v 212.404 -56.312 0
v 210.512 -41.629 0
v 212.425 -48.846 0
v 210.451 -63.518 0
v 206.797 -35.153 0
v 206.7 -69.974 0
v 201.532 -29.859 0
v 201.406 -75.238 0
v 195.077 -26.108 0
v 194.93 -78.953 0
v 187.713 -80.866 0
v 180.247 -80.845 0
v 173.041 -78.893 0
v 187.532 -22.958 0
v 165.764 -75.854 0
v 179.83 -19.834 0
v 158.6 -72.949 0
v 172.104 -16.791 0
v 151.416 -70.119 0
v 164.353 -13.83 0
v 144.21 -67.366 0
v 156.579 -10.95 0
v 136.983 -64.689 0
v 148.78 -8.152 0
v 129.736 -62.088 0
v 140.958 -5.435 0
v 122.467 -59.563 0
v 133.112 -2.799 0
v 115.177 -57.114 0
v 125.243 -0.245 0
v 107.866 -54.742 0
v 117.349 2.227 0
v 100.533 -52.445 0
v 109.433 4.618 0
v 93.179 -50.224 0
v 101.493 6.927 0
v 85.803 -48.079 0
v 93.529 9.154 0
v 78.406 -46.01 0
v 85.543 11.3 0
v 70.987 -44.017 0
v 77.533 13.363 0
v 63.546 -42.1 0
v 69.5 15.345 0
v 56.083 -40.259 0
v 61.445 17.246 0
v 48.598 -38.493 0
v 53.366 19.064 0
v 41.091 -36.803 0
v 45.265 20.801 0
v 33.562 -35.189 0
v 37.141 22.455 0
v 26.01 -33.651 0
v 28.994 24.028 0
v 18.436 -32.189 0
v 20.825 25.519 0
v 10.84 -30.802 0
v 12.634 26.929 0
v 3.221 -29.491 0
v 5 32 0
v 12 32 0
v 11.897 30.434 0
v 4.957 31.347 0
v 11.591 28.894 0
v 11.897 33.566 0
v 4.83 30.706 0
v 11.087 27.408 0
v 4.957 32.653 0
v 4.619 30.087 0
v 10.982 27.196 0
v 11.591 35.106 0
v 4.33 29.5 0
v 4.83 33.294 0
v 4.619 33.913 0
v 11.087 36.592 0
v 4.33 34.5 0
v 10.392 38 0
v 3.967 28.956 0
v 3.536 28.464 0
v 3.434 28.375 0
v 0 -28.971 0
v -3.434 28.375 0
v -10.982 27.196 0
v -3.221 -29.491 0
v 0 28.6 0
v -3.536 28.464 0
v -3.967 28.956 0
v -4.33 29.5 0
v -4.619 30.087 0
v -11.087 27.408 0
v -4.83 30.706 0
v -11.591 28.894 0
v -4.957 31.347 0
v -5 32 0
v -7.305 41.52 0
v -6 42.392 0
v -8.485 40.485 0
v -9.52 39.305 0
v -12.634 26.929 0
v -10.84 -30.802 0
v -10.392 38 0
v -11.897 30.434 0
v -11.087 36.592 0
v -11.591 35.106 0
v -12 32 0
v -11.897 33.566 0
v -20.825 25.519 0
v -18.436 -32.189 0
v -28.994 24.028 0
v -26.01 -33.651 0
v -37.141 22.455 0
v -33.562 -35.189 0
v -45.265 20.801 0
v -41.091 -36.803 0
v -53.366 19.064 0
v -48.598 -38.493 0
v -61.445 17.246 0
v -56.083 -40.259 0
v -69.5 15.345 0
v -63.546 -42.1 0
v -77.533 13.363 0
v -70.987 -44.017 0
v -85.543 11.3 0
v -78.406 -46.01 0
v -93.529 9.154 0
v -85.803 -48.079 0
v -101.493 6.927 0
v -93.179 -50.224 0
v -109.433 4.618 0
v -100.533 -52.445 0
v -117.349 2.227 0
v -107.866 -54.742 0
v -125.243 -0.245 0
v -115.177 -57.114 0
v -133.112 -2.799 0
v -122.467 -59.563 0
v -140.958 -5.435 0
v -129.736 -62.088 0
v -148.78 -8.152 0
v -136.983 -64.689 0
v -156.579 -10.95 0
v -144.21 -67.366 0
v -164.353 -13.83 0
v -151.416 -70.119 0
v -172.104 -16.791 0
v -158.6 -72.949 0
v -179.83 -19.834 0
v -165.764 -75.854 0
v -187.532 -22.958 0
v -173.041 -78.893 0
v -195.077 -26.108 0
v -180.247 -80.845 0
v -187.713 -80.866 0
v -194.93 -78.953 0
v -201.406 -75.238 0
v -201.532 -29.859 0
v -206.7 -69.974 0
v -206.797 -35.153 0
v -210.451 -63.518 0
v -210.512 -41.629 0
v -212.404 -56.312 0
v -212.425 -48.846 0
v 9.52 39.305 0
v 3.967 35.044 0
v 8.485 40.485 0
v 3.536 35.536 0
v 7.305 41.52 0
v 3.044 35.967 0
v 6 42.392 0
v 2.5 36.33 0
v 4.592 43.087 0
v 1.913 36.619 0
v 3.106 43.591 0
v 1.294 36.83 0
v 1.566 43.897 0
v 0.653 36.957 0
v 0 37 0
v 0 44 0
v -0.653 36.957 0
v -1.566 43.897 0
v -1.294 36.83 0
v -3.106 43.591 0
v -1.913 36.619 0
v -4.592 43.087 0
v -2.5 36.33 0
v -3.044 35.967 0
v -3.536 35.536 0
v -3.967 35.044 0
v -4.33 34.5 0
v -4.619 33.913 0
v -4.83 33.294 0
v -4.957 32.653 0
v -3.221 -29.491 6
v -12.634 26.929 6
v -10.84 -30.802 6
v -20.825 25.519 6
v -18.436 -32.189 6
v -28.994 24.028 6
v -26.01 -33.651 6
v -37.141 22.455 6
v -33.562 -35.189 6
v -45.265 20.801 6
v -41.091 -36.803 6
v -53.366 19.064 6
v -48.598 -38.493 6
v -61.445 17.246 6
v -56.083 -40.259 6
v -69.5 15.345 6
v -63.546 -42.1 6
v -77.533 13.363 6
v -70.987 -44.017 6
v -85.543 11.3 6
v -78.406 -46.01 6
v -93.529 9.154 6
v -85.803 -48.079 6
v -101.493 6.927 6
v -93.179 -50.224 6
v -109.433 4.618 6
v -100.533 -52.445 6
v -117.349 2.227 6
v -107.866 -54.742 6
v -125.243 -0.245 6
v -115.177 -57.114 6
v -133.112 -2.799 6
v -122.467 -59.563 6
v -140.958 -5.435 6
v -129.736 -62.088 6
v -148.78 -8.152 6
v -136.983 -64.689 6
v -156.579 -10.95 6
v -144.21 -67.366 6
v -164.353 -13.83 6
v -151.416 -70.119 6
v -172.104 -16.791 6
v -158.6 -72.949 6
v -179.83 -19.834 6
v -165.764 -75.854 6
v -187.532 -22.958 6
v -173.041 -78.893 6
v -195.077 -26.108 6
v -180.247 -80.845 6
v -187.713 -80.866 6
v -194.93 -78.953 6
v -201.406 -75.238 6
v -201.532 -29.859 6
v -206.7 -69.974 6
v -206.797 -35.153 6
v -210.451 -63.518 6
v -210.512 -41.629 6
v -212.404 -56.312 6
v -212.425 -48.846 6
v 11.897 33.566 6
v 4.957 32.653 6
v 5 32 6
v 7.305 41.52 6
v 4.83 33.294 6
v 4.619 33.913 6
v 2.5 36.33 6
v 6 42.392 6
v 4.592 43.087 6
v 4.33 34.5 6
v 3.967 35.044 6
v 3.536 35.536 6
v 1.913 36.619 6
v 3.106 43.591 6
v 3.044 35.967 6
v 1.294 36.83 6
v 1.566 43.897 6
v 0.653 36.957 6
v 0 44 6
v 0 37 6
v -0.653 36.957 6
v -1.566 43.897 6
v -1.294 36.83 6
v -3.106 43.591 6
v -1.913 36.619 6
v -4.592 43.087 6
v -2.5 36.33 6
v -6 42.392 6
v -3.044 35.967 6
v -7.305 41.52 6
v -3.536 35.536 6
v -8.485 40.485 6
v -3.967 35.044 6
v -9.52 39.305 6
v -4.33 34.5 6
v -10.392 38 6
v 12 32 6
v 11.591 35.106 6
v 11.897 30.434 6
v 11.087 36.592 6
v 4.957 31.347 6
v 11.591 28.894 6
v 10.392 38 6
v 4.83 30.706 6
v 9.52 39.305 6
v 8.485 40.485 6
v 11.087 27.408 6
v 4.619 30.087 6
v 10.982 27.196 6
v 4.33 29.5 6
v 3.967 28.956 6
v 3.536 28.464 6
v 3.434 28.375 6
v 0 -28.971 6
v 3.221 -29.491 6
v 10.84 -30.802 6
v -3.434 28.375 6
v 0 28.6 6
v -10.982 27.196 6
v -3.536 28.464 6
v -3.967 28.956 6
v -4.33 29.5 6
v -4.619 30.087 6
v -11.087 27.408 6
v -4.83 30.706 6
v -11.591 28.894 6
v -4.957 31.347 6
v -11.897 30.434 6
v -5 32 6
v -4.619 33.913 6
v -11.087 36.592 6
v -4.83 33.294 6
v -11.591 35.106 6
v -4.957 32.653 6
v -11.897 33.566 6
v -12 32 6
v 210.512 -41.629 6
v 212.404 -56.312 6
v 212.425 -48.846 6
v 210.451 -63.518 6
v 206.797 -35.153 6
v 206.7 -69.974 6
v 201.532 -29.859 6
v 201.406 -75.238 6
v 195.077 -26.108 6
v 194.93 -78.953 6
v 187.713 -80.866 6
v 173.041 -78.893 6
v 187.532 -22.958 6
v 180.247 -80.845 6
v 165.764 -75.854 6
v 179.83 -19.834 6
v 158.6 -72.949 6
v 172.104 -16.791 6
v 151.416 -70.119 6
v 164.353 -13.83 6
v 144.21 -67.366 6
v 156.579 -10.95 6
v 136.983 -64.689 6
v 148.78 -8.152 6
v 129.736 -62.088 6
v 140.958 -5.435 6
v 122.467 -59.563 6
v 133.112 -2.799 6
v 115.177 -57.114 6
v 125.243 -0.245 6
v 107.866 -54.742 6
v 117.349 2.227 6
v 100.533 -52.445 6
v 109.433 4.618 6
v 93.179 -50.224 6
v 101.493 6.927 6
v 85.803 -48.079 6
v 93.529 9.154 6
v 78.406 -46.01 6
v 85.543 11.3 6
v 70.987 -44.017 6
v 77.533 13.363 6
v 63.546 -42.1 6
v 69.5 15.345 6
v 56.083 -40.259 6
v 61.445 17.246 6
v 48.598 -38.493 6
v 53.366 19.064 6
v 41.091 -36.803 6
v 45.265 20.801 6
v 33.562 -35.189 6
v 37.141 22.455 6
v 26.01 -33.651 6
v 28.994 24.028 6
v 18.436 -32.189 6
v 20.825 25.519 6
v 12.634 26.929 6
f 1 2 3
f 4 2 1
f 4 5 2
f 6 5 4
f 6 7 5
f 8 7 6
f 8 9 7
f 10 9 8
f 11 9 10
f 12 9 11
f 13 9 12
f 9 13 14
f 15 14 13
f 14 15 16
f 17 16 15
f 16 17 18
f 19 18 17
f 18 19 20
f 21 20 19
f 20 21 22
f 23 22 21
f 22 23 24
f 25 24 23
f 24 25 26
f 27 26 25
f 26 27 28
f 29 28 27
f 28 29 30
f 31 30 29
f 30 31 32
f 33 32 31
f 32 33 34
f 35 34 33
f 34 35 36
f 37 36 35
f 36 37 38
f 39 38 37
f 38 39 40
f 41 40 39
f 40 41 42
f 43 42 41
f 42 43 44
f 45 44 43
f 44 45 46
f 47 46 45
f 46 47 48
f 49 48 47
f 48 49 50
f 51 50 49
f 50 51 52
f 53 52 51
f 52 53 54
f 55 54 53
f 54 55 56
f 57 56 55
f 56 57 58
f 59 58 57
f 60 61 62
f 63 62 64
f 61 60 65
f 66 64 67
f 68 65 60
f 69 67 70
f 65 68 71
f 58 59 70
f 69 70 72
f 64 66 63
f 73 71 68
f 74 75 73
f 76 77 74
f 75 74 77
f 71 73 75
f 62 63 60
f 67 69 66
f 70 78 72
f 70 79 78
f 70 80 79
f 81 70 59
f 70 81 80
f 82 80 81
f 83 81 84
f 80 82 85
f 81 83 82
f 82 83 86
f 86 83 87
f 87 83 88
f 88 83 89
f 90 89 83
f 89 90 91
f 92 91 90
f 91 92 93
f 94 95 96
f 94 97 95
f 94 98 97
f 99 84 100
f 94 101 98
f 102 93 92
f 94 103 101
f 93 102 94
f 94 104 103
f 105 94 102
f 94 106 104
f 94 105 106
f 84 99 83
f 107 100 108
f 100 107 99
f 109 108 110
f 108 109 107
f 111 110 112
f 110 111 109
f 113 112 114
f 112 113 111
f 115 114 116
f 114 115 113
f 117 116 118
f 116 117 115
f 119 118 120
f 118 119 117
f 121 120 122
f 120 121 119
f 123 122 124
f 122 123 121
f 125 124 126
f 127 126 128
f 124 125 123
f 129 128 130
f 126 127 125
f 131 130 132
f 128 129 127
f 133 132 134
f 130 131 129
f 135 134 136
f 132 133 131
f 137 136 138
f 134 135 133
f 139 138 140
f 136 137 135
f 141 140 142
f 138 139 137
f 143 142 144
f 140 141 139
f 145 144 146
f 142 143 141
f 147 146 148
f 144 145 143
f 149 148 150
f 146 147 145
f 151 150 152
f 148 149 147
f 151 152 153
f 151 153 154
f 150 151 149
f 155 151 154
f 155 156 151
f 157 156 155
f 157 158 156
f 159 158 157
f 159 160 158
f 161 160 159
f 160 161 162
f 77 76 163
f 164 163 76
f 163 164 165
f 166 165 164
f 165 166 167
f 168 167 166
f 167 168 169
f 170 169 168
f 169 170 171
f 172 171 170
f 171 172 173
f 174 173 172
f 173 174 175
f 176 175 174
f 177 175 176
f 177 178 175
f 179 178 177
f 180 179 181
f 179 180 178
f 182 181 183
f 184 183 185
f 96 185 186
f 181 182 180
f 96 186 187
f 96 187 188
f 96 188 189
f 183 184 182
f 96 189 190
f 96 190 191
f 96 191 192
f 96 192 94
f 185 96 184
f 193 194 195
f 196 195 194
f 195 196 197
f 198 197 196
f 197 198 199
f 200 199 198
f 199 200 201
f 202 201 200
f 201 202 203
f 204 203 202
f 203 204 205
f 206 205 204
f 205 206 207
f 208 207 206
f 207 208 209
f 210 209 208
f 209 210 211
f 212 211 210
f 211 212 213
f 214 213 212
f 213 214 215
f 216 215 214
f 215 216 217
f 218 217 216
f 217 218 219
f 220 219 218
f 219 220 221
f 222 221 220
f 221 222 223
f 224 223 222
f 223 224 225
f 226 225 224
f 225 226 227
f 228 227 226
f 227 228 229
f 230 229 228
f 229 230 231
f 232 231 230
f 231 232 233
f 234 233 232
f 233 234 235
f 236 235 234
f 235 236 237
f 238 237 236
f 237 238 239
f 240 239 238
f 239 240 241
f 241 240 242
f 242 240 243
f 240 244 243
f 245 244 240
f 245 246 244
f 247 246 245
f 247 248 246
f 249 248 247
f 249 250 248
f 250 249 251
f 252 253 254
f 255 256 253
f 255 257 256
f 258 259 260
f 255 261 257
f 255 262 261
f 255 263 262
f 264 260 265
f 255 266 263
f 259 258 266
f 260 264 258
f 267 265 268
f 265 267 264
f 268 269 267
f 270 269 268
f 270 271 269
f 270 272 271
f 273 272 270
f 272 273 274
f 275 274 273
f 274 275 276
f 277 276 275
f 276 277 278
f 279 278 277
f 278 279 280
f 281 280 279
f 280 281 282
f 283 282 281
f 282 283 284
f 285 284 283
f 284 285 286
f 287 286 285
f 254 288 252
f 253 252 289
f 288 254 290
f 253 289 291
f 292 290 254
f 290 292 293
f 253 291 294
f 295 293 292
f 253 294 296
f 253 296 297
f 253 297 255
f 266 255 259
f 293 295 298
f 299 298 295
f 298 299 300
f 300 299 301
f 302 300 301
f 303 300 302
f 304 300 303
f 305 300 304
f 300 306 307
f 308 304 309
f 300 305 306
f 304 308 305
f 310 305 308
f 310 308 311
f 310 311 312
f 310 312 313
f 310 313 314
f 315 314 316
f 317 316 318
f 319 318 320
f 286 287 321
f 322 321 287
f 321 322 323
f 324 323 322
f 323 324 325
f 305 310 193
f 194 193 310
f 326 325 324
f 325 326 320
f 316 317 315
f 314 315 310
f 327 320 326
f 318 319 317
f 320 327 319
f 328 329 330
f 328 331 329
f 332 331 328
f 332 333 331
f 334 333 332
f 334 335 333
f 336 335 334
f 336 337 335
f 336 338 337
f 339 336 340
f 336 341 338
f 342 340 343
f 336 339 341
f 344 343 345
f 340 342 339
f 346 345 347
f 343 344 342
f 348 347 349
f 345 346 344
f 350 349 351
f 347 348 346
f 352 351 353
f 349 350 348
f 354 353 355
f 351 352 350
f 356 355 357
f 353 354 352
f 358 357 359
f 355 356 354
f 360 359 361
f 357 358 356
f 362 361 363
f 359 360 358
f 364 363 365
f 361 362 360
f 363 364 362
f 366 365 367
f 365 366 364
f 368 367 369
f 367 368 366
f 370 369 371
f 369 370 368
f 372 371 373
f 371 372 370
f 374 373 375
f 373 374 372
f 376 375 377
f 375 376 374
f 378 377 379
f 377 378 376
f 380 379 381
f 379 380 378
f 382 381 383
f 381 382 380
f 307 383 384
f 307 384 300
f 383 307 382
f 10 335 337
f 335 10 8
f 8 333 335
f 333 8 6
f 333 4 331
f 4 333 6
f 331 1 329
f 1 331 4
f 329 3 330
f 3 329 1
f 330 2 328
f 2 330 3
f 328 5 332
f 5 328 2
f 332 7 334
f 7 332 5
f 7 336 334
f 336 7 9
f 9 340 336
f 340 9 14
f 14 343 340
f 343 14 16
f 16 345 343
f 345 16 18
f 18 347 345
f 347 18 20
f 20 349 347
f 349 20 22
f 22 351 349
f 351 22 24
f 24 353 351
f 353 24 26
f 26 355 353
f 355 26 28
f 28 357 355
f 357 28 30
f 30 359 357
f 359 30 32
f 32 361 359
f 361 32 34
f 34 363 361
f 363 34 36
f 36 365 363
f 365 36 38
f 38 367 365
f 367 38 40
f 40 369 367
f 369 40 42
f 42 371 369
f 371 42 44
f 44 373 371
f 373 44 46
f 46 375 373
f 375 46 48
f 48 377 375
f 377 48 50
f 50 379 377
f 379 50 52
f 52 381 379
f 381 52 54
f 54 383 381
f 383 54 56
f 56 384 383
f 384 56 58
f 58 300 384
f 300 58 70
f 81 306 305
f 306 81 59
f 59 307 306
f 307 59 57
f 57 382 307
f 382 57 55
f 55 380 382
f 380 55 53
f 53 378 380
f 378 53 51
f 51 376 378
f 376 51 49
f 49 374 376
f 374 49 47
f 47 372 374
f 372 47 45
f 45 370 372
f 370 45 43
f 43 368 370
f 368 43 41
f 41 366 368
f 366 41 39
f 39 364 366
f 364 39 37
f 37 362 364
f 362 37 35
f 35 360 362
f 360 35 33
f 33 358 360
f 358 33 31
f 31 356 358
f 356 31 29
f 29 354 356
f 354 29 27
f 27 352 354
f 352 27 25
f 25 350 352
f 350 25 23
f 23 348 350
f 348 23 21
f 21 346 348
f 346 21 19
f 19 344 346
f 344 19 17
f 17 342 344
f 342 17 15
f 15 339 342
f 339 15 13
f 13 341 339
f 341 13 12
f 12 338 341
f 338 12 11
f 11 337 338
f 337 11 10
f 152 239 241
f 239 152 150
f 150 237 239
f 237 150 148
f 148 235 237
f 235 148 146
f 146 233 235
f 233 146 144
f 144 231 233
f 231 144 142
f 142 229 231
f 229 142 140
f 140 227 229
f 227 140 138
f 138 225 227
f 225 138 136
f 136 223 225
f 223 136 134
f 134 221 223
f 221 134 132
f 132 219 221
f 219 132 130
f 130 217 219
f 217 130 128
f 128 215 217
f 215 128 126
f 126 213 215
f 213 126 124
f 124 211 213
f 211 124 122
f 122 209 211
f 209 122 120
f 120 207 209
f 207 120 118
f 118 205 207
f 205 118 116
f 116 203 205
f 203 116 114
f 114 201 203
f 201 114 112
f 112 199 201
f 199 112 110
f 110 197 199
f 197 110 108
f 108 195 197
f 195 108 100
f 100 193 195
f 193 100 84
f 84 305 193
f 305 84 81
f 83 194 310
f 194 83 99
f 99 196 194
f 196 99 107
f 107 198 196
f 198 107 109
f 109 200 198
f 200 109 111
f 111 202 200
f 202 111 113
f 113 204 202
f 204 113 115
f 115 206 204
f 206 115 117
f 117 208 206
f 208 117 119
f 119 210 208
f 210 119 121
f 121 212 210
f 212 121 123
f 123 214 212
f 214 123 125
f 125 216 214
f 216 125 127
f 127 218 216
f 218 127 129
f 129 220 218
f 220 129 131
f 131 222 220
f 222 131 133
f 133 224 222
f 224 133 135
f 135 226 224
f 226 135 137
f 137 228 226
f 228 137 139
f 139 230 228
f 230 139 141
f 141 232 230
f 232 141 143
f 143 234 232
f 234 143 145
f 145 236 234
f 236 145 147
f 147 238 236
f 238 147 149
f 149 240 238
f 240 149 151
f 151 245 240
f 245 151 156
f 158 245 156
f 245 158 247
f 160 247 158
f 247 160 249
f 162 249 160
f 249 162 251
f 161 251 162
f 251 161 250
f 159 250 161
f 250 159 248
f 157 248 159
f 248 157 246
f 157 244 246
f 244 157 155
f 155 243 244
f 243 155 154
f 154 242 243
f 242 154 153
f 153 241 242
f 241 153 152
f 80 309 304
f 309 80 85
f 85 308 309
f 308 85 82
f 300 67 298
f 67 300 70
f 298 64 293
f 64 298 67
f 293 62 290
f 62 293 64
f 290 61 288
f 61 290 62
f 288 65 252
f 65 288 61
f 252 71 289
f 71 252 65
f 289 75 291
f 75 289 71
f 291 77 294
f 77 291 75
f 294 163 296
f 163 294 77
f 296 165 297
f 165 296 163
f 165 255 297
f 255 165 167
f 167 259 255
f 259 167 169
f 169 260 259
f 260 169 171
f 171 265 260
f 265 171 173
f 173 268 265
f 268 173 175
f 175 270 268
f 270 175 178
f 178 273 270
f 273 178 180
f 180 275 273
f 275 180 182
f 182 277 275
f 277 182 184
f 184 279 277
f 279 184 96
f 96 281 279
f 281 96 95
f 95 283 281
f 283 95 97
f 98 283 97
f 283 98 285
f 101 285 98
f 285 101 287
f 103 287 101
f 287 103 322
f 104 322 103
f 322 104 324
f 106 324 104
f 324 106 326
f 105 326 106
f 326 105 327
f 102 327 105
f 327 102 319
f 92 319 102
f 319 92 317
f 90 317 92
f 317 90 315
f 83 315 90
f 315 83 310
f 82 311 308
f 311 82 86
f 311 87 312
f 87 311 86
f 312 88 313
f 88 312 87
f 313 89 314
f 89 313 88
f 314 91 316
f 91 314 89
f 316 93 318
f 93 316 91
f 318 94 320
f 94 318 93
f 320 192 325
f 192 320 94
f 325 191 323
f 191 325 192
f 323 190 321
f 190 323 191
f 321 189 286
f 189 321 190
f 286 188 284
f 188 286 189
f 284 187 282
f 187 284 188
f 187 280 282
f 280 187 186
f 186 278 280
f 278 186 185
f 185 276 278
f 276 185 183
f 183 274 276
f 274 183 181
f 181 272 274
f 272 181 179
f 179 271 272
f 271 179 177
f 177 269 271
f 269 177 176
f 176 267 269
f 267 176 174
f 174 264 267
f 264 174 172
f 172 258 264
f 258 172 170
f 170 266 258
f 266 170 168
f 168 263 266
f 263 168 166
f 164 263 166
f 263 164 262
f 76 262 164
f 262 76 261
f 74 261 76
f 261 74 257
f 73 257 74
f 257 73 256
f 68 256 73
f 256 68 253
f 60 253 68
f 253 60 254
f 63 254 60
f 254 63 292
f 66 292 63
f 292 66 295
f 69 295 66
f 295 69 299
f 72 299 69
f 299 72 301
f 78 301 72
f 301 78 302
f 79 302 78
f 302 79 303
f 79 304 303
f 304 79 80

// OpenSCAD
// hanger-print: rack w22 w=22 cm slope=15.92 deg bow=0.59 cm r=2.86 cm depth=6.0 mm
// Print flat (layers parallel to the page). Generated by hanger_print.mesh.scad; do not edit by hand.
depth = 6.0;
union() {
  linear_extrude(height = depth) polygon([[4.563, 28.234], [12.634, 26.929], [20.825, 25.519], [28.994, 24.028], [37.141, 22.455], [45.265, 20.801], [53.366, 19.064], [61.445, 17.246], [69.500, 15.345], [77.533, 13.363], [85.543, 11.300], [93.529, 9.154], [101.493, 6.927], [109.433, 4.618], [117.349, 2.227], [125.243, -0.245], [133.112, -2.799], [140.958, -5.435], [148.780, -8.152], [156.579, -10.950], [164.353, -13.830], [172.104, -16.791], [179.830, -19.834], [187.532, -22.958], [195.077, -26.108], [201.532, -29.859], [206.797, -35.153], [210.512, -41.629], [212.425, -48.846], [212.404, -56.312], [210.451, -63.518], [206.700, -69.974], [201.406, -75.238], [194.930, -78.953], [187.713, -80.866], [180.247, -80.845], [173.041, -78.893], [165.764, -75.854], [158.600, -72.949], [151.416, -70.119], [144.210, -67.366], [136.983, -64.689], [129.736, -62.088], [122.467, -59.563], [115.177, -57.114], [107.866, -54.742], [100.533, -52.445], [93.179, -50.224], [85.803, -48.079], [78.406, -46.010], [70.987, -44.017], [63.546, -42.100], [56.083, -40.259], [48.598, -38.493], [41.091, -36.803], [33.562, -35.189], [26.010, -33.651], [18.436, -32.189], [10.840, -30.802], [3.221, -29.491], [-4.563, -28.234]]);
  linear_extrude(height = depth) polygon([[4.563, -28.234], [-3.221, -29.491], [-10.840, -30.802], [-18.436, -32.189], [-26.010, -33.651], [-33.562, -35.189], [-41.091, -36.803], [-48.598, -38.493], [-56.083, -40.259], [-63.546, -42.100], [-70.987, -44.017], [-78.406, -46.010], [-85.803, -48.079], [-93.179, -50.224], [-100.533, -52.445], [-107.866, -54.742], [-115.177, -57.114], [-122.467, -59.563], [-129.736, -62.088], [-136.983, -64.689], [-144.210, -67.366], [-151.416, -70.119], [-158.600, -72.949], [-165.764, -75.854], [-173.041, -78.893], [-180.247, -80.845], [-187.713, -80.866], [-194.930, -78.953], [-201.406, -75.238], [-206.700, -69.974], [-210.451, -63.518], [-212.404, -56.312], [-212.425, -48.846], [-210.512, -41.629], [-206.797, -35.153], [-201.532, -29.859], [-195.077, -26.108], [-187.532, -22.958], [-179.830, -19.834], [-172.104, -16.791], [-164.353, -13.830], [-156.579, -10.950], [-148.780, -8.152], [-140.958, -5.435], [-133.112, -2.799], [-125.243, -0.245], [-117.349, 2.227], [-109.433, 4.618], [-101.493, 6.927], [-93.529, 9.154], [-85.543, 11.300], [-77.533, 13.363], [-69.500, 15.345], [-61.445, 17.246], [-53.366, 19.064], [-45.265, 20.801], [-37.141, 22.455], [-28.994, 24.028], [-20.825, 25.519], [-12.634, 26.929], [-4.563, 28.234]]);
  linear_extrude(height = depth) polygon([[28.600, 0.000], [28.355, 3.733], [27.625, 7.402], [26.423, 10.945], [24.768, 14.300], [22.690, 17.411], [20.223, 20.223], [17.411, 22.690], [14.300, 24.768], [10.945, 26.423], [7.402, 27.625], [3.733, 28.355], [0.000, 28.600], [-3.733, 28.355], [-7.402, 27.625], [-10.945, 26.423], [-14.300, 24.768], [-17.411, 22.690], [-20.223, 20.223], [-22.690, 17.411], [-24.768, 14.300], [-26.423, 10.945], [-27.625, 7.402], [-28.355, 3.733], [-28.600, 0.000], [-28.355, -3.733], [-27.625, -7.402], [-26.423, -10.945], [-24.768, -14.300], [-22.690, -17.411], [-20.223, -20.223], [-17.411, -22.690], [-14.300, -24.768], [-10.945, -26.423], [-7.402, -27.625], [-3.733, -28.355], [-0.000, -28.600], [3.733, -28.355], [7.402, -27.625], [10.945, -26.423], [14.300, -24.768], [17.411, -22.690], [20.223, -20.223], [22.690, -17.411], [24.768, -14.300], [26.423, -10.945], [27.625, -7.402], [28.355, -3.733]]);
  linear_extrude(height = depth) polygon([[-7.000, 0.000], [7.000, 0.000], [7.000, 27.000], [-7.000, 27.000]]);
  linear_extrude(height = depth) difference() { polygon([[12.000, 32.000], [11.897, 33.566], [11.591, 35.106], [11.087, 36.592], [10.392, 38.000], [9.520, 39.305], [8.485, 40.485], [7.305, 41.520], [6.000, 42.392], [4.592, 43.087], [3.106, 43.591], [1.566, 43.897], [0.000, 44.000], [-1.566, 43.897], [-3.106, 43.591], [-4.592, 43.087], [-6.000, 42.392], [-7.305, 41.520], [-8.485, 40.485], [-9.520, 39.305], [-10.392, 38.000], [-11.087, 36.592], [-11.591, 35.106], [-11.897, 33.566], [-12.000, 32.000], [-11.897, 30.434], [-11.591, 28.894], [-11.087, 27.408], [-10.392, 26.000], [-9.520, 24.695], [-8.485, 23.515], [-7.305, 22.480], [-6.000, 21.608], [-4.592, 20.913], [-3.106, 20.409], [-1.566, 20.103], [-0.000, 20.000], [1.566, 20.103], [3.106, 20.409], [4.592, 20.913], [6.000, 21.608], [7.305, 22.480], [8.485, 23.515], [9.520, 24.695], [10.392, 26.000], [11.087, 27.408], [11.591, 28.894], [11.897, 30.434]]); polygon([[5.000, 32.000], [4.957, 32.653], [4.830, 33.294], [4.619, 33.913], [4.330, 34.500], [3.967, 35.044], [3.536, 35.536], [3.044, 35.967], [2.500, 36.330], [1.913, 36.619], [1.294, 36.830], [0.653, 36.957], [0.000, 37.000], [-0.653, 36.957], [-1.294, 36.830], [-1.913, 36.619], [-2.500, 36.330], [-3.044, 35.967], [-3.536, 35.536], [-3.967, 35.044], [-4.330, 34.500], [-4.619, 33.913], [-4.830, 33.294], [-4.957, 32.653], [-5.000, 32.000], [-4.957, 31.347], [-4.830, 30.706], [-4.619, 30.087], [-4.330, 29.500], [-3.967, 28.956], [-3.536, 28.464], [-3.044, 28.033], [-2.500, 27.670], [-1.913, 27.381], [-1.294, 27.170], [-0.653, 27.043], [-0.000, 27.000], [0.653, 27.043], [1.294, 27.170], [1.913, 27.381], [2.500, 27.670], [3.044, 28.033], [3.536, 28.464], [3.967, 28.956], [4.330, 29.500], [4.619, 30.087], [4.830, 30.706], [4.957, 31.347]]); }
}
